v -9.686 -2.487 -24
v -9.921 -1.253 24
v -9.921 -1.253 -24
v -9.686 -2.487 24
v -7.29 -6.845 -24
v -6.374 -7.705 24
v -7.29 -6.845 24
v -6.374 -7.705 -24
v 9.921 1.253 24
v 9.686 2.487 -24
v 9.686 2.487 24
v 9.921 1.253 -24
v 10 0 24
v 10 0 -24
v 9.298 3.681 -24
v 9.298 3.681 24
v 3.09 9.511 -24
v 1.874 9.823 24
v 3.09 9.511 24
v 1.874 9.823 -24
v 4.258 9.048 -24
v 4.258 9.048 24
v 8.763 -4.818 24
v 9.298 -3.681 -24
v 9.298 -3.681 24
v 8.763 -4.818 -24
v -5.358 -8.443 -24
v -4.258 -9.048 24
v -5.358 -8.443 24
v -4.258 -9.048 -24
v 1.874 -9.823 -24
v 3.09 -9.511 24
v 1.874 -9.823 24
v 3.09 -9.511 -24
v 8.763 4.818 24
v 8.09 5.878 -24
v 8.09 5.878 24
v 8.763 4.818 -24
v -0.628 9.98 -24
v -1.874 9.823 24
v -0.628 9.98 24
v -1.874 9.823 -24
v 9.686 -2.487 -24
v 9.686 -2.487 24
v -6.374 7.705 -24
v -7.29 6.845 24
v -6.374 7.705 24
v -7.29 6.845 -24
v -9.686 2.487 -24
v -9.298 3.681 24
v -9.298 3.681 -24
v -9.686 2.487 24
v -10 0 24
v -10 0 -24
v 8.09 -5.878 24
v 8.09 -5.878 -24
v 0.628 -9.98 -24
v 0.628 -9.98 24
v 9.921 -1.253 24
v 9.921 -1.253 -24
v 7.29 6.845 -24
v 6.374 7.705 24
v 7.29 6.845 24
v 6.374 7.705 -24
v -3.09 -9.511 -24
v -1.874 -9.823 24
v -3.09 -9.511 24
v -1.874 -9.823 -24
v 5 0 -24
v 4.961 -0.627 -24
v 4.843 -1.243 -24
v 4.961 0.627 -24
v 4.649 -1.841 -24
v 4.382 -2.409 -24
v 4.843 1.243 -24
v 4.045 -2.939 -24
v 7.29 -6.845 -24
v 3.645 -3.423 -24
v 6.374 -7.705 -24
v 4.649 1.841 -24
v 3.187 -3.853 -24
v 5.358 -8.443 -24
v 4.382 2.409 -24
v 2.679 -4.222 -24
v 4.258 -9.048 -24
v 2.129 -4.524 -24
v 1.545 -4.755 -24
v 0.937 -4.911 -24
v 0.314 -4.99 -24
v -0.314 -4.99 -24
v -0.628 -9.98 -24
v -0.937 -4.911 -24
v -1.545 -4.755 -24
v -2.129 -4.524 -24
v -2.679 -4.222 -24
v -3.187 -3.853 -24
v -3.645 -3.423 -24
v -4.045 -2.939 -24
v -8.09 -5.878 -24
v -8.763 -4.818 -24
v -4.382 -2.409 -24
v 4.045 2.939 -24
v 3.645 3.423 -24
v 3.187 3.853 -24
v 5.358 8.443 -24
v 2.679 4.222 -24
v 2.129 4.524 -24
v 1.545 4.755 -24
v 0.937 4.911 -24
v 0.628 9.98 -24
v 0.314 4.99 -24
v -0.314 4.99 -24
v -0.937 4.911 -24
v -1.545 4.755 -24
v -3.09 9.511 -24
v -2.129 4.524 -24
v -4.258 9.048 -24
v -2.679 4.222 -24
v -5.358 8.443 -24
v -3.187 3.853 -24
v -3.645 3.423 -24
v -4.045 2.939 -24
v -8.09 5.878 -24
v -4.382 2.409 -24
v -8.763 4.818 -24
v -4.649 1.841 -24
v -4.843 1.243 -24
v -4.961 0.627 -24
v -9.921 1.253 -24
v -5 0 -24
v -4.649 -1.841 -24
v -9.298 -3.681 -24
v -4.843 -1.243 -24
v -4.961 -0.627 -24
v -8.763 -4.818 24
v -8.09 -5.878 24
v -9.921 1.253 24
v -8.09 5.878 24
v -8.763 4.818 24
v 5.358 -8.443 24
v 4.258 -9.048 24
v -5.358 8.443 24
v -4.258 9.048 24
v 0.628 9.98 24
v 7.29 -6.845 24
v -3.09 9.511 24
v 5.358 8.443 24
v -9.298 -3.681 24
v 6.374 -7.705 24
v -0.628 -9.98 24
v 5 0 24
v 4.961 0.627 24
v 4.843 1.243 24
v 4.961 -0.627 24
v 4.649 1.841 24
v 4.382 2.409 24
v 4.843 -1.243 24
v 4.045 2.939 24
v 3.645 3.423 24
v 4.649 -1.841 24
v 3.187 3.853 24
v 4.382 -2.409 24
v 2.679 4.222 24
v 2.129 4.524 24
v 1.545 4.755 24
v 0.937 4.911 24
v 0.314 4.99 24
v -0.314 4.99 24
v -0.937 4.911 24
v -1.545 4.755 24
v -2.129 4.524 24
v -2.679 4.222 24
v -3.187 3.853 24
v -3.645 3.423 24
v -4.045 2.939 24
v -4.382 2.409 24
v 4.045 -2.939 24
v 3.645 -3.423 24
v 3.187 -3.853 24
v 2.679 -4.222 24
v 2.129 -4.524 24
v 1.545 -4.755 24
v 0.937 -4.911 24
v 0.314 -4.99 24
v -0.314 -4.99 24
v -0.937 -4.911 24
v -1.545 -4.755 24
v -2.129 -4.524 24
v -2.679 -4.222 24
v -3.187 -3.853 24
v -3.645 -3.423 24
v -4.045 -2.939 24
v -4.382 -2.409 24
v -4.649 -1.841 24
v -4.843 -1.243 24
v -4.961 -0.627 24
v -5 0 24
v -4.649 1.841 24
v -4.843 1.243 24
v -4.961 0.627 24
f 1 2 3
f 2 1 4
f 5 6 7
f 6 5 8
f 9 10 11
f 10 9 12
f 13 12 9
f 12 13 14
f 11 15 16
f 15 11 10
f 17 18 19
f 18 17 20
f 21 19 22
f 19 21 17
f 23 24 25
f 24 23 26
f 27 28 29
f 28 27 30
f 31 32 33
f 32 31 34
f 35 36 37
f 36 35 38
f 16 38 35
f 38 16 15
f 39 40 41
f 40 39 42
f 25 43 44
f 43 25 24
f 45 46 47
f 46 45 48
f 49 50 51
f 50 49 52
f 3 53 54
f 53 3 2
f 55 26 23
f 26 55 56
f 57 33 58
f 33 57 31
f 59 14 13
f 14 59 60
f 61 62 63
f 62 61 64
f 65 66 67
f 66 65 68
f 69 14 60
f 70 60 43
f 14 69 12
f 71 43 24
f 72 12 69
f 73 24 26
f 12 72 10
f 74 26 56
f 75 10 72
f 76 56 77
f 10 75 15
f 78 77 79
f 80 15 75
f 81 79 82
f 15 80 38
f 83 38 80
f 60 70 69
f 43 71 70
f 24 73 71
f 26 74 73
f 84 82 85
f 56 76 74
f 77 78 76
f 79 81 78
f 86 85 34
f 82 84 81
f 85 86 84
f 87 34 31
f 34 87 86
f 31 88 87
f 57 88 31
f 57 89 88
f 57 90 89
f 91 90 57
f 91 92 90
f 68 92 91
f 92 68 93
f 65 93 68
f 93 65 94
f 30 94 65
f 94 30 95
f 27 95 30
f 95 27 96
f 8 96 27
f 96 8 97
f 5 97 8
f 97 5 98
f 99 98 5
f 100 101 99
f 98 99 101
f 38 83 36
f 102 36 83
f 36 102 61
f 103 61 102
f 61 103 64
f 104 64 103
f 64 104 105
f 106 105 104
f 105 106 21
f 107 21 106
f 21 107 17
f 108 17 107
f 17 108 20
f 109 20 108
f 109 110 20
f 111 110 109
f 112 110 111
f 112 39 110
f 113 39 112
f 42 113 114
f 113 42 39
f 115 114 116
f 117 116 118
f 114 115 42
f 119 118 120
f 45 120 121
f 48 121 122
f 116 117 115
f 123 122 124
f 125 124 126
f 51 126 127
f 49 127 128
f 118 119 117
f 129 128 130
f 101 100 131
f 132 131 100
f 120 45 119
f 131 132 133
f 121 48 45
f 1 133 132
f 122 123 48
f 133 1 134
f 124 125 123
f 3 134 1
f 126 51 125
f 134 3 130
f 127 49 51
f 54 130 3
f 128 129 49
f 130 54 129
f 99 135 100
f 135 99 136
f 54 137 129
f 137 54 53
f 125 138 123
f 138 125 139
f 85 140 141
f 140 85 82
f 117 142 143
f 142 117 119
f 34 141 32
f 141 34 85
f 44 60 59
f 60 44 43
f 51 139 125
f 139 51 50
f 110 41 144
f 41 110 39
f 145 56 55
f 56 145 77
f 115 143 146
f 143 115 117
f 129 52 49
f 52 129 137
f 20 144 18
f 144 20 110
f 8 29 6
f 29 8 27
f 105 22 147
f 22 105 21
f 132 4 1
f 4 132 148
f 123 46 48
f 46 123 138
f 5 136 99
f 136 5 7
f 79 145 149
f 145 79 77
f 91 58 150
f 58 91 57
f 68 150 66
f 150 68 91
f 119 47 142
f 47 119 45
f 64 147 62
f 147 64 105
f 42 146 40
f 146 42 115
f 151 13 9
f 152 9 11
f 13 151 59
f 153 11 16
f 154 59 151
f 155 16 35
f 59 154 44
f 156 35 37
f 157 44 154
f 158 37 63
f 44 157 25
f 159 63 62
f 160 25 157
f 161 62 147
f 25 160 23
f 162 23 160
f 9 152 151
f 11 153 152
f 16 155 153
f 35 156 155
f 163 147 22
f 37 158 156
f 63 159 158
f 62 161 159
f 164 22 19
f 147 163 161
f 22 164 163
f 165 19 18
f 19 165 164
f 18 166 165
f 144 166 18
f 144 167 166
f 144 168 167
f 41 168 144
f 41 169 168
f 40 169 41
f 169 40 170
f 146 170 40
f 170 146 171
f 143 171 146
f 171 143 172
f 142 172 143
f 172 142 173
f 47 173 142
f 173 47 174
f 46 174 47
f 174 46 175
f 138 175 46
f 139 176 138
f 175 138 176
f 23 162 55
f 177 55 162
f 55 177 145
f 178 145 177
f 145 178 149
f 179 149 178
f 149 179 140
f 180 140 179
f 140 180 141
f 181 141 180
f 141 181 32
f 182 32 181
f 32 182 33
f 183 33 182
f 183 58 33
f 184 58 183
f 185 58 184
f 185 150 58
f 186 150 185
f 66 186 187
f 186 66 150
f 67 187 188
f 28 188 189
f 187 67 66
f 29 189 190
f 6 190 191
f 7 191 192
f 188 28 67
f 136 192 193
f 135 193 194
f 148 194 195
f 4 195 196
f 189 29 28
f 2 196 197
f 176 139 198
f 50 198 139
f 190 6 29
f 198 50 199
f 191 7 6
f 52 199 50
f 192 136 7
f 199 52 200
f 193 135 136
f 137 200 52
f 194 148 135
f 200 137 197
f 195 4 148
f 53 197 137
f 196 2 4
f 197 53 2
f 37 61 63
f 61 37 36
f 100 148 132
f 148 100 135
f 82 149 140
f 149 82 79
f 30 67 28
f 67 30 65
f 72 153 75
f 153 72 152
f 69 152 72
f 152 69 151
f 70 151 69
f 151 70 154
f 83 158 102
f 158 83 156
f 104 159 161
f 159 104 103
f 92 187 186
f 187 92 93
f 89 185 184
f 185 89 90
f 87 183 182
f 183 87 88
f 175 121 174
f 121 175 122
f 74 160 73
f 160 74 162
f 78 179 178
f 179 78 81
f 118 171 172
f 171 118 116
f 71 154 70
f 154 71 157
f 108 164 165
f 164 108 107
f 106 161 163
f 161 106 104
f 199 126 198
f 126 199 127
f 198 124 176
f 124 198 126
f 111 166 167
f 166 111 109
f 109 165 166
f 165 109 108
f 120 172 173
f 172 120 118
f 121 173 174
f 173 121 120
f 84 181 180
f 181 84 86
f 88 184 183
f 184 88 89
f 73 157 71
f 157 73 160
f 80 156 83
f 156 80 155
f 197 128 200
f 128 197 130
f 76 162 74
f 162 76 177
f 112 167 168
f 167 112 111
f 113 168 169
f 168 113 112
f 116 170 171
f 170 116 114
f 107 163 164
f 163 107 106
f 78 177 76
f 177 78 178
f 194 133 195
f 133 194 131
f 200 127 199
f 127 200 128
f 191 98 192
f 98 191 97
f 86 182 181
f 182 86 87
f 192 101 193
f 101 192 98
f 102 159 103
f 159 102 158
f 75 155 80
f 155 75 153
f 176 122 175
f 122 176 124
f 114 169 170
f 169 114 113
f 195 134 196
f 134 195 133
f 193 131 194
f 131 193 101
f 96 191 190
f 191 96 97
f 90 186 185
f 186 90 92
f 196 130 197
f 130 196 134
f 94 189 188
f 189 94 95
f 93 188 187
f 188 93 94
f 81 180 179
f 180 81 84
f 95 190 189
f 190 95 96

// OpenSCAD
$fn = 50;


difference() {
	union() {
		translate(v = [0, 0, -24.0000000000]) {
			cylinder(h = 48, r = 10.0000000000);
		}
	}
	union() {
		translate(v = [0, 0, -100.0000000000]) {
			cylinder(h = 200, r = 5.0000000000);
		}
	}
}
